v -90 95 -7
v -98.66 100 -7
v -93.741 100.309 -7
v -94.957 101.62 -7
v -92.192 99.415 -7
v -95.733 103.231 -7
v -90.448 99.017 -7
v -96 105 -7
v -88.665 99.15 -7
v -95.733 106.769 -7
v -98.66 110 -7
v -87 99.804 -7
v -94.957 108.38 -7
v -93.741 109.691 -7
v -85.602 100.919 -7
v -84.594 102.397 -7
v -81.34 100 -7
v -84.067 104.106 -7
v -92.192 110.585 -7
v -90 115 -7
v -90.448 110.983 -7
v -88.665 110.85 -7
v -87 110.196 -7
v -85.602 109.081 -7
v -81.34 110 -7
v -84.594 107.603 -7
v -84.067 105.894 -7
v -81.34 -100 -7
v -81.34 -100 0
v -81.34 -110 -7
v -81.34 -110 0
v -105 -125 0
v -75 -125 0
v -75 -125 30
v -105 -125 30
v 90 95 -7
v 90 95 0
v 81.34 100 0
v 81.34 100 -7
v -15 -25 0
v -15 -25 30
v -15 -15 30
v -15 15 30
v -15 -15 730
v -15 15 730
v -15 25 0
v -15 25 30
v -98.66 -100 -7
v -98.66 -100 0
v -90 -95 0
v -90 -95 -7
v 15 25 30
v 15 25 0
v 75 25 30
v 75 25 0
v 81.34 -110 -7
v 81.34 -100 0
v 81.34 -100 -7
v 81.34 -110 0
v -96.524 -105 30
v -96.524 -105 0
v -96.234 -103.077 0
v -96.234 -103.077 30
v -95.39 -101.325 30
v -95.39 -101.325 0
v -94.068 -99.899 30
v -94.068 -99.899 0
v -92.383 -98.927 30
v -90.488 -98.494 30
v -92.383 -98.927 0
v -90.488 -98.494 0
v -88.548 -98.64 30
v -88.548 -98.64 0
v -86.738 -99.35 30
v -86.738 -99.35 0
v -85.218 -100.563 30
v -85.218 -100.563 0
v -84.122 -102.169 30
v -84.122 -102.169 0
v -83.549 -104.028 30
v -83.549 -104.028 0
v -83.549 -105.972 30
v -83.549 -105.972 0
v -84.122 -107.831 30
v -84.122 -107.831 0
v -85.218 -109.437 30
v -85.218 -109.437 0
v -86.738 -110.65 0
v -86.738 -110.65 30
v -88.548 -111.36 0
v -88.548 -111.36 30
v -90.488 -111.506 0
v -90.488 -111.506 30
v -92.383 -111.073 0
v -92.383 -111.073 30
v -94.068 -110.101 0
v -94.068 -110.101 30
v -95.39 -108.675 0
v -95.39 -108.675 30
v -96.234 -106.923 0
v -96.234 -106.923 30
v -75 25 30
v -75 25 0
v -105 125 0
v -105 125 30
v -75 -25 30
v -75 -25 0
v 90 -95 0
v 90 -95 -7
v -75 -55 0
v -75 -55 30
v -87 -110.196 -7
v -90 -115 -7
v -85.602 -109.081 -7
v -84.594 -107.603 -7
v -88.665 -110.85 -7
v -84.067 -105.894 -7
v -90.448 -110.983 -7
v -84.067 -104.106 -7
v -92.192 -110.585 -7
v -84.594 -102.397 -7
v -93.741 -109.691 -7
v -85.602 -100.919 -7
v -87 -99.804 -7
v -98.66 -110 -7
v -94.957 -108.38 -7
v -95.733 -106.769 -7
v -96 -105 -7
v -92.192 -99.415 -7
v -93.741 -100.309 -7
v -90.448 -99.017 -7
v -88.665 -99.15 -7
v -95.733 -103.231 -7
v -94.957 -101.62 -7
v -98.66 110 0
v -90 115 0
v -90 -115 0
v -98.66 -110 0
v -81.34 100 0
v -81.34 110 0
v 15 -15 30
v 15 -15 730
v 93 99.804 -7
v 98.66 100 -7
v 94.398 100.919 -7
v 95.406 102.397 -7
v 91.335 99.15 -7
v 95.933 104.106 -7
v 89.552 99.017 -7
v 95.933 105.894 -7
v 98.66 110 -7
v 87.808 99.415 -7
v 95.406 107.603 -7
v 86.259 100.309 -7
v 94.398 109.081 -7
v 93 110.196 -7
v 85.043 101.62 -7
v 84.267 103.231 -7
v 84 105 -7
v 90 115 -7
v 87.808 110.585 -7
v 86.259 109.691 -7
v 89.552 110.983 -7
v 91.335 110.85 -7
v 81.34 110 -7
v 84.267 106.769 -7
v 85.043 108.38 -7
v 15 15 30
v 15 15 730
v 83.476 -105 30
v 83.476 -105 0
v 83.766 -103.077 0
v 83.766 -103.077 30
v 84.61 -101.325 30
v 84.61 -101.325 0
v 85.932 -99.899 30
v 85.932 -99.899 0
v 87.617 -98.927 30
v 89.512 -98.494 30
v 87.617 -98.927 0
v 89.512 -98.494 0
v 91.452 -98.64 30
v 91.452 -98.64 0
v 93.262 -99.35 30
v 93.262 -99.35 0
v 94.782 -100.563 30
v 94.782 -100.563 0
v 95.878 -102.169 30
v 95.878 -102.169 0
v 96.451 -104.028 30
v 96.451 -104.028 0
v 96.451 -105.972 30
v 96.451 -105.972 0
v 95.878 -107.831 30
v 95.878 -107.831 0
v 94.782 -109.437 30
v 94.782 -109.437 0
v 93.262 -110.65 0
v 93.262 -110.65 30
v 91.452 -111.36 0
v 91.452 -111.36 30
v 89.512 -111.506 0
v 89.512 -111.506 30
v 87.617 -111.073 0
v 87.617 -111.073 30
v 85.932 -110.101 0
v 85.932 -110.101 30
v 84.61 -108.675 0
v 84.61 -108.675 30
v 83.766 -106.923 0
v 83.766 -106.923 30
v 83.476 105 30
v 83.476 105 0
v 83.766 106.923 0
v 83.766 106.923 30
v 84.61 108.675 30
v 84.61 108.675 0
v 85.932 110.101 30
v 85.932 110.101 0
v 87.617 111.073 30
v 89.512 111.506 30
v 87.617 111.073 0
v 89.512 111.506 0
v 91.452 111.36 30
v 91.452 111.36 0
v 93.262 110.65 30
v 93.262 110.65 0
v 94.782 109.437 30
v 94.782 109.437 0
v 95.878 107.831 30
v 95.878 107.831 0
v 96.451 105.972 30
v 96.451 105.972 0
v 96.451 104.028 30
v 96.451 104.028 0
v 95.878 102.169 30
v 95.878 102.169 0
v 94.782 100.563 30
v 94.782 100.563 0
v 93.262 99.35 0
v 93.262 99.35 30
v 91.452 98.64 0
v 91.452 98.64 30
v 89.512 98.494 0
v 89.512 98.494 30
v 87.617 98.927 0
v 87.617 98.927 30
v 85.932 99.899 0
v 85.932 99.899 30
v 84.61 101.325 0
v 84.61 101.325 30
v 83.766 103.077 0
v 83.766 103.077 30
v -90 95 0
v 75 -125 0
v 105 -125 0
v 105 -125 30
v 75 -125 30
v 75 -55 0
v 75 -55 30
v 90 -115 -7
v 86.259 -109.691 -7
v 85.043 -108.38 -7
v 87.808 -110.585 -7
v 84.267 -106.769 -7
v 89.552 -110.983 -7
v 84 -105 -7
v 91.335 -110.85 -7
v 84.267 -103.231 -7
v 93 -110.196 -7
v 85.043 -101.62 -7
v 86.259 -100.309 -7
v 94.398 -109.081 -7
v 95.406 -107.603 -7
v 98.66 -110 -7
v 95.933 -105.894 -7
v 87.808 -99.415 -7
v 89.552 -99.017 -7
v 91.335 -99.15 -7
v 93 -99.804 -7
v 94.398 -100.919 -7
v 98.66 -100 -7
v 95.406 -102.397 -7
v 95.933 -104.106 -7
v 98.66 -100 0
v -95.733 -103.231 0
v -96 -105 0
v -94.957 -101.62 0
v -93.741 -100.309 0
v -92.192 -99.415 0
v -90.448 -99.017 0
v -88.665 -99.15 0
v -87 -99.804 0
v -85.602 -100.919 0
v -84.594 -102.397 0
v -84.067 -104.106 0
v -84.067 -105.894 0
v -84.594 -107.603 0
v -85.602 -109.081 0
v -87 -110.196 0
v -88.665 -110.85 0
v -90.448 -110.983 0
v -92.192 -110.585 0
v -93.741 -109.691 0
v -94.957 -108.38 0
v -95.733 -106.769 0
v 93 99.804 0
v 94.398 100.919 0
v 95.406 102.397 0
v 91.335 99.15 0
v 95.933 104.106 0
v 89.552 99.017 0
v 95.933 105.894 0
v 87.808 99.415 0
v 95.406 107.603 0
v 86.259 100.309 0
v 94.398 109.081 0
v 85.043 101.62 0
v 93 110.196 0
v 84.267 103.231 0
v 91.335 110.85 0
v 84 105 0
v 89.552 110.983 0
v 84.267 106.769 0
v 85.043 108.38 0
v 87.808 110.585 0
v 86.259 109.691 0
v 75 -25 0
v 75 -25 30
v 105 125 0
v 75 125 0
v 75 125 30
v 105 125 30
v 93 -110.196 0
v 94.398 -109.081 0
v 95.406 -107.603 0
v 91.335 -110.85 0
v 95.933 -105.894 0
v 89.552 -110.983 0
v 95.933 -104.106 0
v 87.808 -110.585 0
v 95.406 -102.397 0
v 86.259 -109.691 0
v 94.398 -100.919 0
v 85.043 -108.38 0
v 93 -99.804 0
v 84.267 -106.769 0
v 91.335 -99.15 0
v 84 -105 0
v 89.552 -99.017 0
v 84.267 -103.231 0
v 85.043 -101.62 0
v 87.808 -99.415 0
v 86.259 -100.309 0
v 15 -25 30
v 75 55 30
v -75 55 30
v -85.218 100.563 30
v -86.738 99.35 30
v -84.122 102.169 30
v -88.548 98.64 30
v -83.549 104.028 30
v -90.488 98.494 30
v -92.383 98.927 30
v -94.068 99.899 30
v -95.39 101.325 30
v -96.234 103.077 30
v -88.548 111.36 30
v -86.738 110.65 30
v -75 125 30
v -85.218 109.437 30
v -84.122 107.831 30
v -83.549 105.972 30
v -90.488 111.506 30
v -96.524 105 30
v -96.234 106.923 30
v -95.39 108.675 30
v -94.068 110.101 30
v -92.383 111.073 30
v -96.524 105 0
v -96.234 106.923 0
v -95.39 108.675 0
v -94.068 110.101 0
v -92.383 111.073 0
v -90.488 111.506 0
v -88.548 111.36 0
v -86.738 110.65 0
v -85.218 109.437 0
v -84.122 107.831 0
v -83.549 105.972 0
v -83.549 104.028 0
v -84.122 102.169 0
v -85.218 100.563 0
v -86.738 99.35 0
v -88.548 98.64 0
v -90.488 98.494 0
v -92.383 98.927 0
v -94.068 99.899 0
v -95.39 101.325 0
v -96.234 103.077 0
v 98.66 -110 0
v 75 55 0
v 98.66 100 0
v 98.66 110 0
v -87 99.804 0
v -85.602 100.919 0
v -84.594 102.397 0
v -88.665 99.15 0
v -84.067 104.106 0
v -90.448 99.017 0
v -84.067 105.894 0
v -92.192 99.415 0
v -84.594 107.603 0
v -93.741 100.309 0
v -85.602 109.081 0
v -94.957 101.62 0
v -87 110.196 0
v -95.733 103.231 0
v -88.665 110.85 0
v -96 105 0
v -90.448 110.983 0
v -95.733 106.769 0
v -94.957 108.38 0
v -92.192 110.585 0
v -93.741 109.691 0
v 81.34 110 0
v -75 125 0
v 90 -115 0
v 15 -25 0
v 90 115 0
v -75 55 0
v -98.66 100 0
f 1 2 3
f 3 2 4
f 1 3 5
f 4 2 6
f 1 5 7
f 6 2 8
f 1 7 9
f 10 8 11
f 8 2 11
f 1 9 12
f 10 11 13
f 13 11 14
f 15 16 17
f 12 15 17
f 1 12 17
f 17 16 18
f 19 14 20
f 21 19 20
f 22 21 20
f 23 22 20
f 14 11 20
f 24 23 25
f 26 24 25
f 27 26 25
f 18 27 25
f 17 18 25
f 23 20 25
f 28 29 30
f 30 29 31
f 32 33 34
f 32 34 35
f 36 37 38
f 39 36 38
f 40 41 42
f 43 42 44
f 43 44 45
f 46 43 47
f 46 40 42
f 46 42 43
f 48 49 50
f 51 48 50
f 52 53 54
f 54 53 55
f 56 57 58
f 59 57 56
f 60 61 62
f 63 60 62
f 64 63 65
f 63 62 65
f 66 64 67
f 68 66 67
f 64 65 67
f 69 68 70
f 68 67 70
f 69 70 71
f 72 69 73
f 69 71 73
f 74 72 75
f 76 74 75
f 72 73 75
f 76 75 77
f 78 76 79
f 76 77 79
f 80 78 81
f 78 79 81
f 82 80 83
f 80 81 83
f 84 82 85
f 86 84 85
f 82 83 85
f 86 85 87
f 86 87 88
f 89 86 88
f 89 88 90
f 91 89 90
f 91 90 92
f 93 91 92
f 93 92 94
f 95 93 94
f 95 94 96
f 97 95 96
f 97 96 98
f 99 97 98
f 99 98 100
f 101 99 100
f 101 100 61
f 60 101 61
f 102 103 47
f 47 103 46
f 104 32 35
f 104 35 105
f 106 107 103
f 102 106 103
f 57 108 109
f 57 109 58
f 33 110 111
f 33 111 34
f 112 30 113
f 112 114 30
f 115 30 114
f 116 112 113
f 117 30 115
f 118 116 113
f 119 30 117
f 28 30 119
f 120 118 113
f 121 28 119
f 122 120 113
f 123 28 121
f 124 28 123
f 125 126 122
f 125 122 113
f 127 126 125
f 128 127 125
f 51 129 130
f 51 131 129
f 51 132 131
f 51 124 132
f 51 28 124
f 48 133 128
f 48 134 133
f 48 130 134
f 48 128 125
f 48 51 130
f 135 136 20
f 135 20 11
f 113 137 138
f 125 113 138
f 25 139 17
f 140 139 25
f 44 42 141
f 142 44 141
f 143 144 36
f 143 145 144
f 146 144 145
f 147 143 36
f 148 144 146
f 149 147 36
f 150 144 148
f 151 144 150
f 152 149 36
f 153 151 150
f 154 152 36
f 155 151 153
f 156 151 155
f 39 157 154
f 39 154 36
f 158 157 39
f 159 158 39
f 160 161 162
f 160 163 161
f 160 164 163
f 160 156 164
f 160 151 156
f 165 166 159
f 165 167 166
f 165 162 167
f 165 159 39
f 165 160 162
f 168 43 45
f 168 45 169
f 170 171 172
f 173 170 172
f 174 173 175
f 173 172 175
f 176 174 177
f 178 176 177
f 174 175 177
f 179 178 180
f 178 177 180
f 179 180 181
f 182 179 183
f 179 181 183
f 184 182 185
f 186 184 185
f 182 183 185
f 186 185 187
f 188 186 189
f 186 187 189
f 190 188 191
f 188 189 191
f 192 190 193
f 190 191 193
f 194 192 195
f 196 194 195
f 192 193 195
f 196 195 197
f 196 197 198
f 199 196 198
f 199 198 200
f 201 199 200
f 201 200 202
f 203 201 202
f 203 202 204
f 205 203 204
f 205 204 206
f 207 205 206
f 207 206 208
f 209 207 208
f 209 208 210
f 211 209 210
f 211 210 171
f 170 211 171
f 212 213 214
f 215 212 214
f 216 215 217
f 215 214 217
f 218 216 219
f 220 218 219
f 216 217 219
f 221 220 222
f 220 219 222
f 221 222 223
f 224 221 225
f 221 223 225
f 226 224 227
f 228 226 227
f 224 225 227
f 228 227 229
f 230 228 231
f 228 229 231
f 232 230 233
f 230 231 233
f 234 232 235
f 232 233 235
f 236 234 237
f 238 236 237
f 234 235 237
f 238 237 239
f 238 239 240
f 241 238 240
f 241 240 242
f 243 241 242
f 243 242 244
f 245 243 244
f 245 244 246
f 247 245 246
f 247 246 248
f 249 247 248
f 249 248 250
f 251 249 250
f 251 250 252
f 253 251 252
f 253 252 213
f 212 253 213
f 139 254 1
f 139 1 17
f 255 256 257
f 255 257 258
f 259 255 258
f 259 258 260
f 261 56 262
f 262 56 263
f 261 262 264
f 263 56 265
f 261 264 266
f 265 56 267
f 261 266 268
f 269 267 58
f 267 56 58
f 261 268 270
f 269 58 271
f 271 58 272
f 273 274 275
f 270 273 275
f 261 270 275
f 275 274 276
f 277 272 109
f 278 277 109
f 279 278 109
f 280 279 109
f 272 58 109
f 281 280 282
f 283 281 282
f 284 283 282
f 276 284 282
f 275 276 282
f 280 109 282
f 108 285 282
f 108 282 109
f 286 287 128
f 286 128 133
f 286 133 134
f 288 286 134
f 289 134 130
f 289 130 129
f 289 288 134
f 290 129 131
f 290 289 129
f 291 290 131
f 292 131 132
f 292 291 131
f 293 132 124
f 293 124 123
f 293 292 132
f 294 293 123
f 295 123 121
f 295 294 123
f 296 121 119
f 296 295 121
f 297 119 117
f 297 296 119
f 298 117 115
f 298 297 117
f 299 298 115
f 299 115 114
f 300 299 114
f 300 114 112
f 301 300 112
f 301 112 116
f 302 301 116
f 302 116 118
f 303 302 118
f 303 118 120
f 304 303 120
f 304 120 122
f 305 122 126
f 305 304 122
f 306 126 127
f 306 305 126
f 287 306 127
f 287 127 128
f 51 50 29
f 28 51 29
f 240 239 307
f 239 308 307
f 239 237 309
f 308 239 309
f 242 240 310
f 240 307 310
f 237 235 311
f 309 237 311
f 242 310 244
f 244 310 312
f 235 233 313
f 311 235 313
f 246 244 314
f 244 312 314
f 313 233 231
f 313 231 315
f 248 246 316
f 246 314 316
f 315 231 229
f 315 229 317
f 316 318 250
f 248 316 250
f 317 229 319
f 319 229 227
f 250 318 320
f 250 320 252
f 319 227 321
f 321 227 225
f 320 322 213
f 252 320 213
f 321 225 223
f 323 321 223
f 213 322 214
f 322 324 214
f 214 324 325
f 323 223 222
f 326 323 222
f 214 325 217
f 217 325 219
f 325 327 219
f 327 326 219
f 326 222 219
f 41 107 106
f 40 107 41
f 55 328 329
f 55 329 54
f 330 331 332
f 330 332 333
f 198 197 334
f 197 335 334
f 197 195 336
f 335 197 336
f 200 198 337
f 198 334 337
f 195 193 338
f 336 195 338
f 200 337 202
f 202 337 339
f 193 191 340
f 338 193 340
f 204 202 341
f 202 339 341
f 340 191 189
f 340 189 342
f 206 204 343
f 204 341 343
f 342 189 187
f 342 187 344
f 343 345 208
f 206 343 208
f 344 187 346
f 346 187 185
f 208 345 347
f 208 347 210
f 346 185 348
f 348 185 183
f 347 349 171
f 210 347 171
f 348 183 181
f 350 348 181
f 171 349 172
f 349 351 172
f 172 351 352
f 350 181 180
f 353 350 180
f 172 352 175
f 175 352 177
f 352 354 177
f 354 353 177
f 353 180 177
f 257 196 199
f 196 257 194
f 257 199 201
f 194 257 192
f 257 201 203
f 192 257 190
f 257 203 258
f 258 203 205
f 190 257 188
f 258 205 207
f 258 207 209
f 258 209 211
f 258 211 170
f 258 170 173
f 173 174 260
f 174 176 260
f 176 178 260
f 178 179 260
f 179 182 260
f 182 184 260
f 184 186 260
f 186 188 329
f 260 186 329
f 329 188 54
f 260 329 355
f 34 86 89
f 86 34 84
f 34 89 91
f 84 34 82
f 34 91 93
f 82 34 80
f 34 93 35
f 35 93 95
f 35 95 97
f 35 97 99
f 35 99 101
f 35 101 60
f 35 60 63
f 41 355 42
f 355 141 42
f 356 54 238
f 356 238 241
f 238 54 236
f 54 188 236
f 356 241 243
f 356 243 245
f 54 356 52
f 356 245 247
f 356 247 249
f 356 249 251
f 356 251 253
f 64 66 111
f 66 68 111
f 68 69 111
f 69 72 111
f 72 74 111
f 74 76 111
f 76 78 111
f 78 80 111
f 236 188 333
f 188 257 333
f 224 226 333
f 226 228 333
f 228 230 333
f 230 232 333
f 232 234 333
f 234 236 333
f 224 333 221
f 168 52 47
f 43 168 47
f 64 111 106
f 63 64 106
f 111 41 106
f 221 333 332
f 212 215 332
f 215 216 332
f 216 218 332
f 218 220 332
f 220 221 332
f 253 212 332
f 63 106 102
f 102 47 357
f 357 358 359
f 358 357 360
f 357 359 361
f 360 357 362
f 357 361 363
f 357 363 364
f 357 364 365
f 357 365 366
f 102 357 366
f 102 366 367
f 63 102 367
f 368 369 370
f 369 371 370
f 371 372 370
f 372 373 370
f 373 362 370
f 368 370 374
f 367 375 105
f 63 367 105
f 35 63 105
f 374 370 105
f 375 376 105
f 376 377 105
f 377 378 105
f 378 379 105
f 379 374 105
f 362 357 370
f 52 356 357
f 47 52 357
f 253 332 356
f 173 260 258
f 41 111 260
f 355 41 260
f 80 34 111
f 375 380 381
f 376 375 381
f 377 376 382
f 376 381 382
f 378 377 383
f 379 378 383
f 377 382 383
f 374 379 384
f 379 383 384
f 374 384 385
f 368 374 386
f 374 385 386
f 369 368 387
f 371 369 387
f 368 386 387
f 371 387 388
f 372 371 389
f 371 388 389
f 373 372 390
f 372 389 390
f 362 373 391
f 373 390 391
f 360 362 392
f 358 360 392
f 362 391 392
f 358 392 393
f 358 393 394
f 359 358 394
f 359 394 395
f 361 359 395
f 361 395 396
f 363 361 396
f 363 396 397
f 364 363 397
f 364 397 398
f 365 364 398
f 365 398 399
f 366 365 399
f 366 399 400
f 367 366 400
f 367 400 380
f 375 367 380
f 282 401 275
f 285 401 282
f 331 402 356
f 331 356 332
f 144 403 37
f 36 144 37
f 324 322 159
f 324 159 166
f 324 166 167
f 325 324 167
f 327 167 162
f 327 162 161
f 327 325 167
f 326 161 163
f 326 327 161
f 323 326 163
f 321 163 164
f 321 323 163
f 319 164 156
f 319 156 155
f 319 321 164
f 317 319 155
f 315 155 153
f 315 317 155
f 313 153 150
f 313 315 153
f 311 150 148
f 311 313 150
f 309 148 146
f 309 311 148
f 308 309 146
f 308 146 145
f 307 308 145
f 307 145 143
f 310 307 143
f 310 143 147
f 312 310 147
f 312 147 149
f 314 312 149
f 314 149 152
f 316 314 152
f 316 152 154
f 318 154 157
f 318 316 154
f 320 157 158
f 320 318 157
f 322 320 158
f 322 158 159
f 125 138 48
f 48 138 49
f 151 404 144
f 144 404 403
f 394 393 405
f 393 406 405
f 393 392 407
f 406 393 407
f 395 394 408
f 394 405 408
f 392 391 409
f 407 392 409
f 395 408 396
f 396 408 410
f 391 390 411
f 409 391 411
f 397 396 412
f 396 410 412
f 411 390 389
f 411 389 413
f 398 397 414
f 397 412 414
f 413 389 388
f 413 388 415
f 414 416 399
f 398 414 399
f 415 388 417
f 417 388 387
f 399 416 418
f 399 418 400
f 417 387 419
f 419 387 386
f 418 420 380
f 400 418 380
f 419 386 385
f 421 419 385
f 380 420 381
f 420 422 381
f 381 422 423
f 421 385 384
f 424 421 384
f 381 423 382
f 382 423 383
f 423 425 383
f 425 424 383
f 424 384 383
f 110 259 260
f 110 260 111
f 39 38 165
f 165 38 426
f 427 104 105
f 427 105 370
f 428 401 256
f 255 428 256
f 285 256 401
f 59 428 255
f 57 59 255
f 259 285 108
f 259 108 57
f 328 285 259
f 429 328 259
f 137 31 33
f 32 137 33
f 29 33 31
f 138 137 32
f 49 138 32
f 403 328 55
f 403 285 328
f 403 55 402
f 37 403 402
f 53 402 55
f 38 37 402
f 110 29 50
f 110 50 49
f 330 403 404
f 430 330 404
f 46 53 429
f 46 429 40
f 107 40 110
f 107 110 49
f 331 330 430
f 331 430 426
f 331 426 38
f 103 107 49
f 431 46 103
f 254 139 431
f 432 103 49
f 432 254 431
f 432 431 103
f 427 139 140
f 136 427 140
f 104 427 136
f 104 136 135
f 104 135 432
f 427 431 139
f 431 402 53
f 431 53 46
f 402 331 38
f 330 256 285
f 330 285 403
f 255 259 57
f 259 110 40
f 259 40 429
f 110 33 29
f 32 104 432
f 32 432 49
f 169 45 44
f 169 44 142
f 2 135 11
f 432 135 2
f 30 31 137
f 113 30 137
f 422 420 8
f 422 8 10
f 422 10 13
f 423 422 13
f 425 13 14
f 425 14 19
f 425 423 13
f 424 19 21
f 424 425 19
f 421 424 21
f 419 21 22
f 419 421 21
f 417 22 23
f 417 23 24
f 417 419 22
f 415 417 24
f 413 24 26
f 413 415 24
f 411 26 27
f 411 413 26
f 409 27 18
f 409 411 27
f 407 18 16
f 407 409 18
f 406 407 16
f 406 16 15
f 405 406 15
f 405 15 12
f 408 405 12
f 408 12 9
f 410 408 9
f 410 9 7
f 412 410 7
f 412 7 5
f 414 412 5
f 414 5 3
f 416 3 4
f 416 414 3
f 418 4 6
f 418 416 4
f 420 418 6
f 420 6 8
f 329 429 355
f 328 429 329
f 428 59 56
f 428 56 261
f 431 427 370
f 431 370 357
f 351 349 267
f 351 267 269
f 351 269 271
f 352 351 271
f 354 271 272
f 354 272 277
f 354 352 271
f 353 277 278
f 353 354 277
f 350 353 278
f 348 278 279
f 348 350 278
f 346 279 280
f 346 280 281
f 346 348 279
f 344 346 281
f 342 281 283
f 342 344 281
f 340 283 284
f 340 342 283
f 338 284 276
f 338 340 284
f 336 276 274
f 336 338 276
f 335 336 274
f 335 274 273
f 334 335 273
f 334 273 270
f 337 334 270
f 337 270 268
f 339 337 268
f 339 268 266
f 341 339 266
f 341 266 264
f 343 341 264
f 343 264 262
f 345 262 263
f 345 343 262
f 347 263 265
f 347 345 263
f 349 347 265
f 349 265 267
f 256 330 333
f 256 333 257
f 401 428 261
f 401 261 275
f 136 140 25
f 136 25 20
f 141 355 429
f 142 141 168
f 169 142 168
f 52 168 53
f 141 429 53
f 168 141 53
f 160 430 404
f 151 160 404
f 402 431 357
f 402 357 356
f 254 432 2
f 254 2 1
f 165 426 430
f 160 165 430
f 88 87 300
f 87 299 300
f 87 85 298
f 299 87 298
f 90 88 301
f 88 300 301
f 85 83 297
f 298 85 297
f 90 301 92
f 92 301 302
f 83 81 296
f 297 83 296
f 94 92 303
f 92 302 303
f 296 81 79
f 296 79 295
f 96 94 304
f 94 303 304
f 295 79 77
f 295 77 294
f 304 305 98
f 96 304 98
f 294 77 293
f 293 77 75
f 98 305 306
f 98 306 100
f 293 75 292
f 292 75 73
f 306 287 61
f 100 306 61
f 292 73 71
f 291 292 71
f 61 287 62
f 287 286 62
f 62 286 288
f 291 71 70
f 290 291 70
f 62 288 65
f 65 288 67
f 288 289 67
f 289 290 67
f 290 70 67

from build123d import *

# Parameters (mm, degrees)
SKETCH1_W           = 60
SKETCH1_H           = 50
BOSS_EXTRUDE1_DEPTH = 30
SKETCH2_W           = 30
SKETCH2_H           = 30
BOSS_EXTRUDE2_DEPTH = 700
SKETCH3_R           = 6
BOSS_EXTRUDE3_DEPTH = 7
CUT_EXTRUDE1_REACH  = 732
SKETCH4_R           = 6.523816089


with BuildPart() as part:
    # Sketch1 → Boss-Extrude1 (new body)
    with BuildSketch(Plane.XY):
        Polygon((-105, 125), (-75, 125), (-75, 55), (75, 55), (75, 125), (105, 125), (105, -125), (75, -125), (75, -55), (-75, -55), (-75, -125), (-105, -125), align=None)
        with Locations((-45, 0)):
            Rectangle(SKETCH1_W, SKETCH1_H, mode=Mode.SUBTRACT)
        with Locations((45, 0)):
            Rectangle(SKETCH1_W, SKETCH1_H, mode=Mode.SUBTRACT)
    extrude(amount=BOSS_EXTRUDE1_DEPTH)

    # Sketch2 → Boss-Extrude2 (add)
    with BuildSketch(Plane.XY.offset(30)):
        Rectangle(SKETCH2_W, SKETCH2_H)
    extrude(amount=BOSS_EXTRUDE2_DEPTH)

    # Sketch3 → Boss-Extrude3 (add)
    with BuildSketch(Plane(origin=(0, 0, 0), x_dir=(-1, 0, 0), z_dir=(0, 0, -1))):
        Polygon((81.339745962, 110), (90, 115), (98.660254038, 110), (98.660254038, 100), (90, 95), (81.339745962, 100), align=None)
        with Locations((90, 105)):
            Circle(SKETCH3_R, mode=Mode.SUBTRACT)
        Polygon((-90, 115), (-98.660254038, 110), (-98.660254038, 100), (-90, 95), (-81.339745962, 100), (-81.339745962, 110), align=None)
        with Locations((-90, 105)):
            Circle(SKETCH3_R, mode=Mode.SUBTRACT)
        Polygon((81.339745962, -100), (81.339745962, -110), (90, -115), (98.660254038, -110), (98.660254038, -100), (90, -95), align=None)
        with Locations((90, -105)):
            Circle(SKETCH3_R, mode=Mode.SUBTRACT)
        Polygon((-81.339745962, -110), (-90, -115), (-98.660254038, -110), (-98.660254038, -100), (-90, -95), (-81.339745962, -100), align=None)
        with Locations((-90, -105)):
            Circle(SKETCH3_R, mode=Mode.SUBTRACT)
    extrude(amount=BOSS_EXTRUDE3_DEPTH)

    # Sketch4 → Cut-Extrude1 (cut, up to next)
    with BuildSketch(Plane(origin=(0, 0, 0), x_dir=(-1, 0, 0), z_dir=(0, 0, -1)), mode=Mode.PRIVATE) as cut_extrude1_sk1:
        with Locations((-90, 105)):
            Circle(SKETCH4_R)
    cut_extrude1_tool1 = extrude(cut_extrude1_sk1.sketch, amount=-CUT_EXTRUDE1_REACH, mode=Mode.PRIVATE) & part.part
    add(cut_extrude1_tool1.solids().sort_by_distance((90, 105, 0))[0], mode=Mode.SUBTRACT)
    # Sketch4 → Cut-Extrude1 (cut, up to next)
    with BuildSketch(Plane(origin=(0, 0, 0), x_dir=(-1, 0, 0), z_dir=(0, 0, -1)), mode=Mode.PRIVATE) as cut_extrude1_sk2:
        with Locations((90, 105)):
            Circle(SKETCH4_R)
    cut_extrude1_tool2 = extrude(cut_extrude1_sk2.sketch, amount=-CUT_EXTRUDE1_REACH, mode=Mode.PRIVATE) & part.part
    add(cut_extrude1_tool2.solids().sort_by_distance((-90, 105, 0))[0], mode=Mode.SUBTRACT)
    # Sketch4 → Cut-Extrude1 (cut, up to next)
    with BuildSketch(Plane(origin=(0, 0, 0), x_dir=(-1, 0, 0), z_dir=(0, 0, -1)), mode=Mode.PRIVATE) as cut_extrude1_sk3:
        with Locations((90, -105)):
            Circle(SKETCH4_R)
    cut_extrude1_tool3 = extrude(cut_extrude1_sk3.sketch, amount=-CUT_EXTRUDE1_REACH, mode=Mode.PRIVATE) & part.part
    add(cut_extrude1_tool3.solids().sort_by_distance((-90, -105, 0))[0], mode=Mode.SUBTRACT)
    # Sketch4 → Cut-Extrude1 (cut, up to next)
    with BuildSketch(Plane(origin=(0, 0, 0), x_dir=(-1, 0, 0), z_dir=(0, 0, -1)), mode=Mode.PRIVATE) as cut_extrude1_sk4:
        with Locations((-90, -105)):
            Circle(SKETCH4_R)
    cut_extrude1_tool4 = extrude(cut_extrude1_sk4.sketch, amount=-CUT_EXTRUDE1_REACH, mode=Mode.PRIVATE) & part.part
    add(cut_extrude1_tool4.solids().sort_by_distance((90, -105, 0))[0], mode=Mode.SUBTRACT)


solid = part.part
